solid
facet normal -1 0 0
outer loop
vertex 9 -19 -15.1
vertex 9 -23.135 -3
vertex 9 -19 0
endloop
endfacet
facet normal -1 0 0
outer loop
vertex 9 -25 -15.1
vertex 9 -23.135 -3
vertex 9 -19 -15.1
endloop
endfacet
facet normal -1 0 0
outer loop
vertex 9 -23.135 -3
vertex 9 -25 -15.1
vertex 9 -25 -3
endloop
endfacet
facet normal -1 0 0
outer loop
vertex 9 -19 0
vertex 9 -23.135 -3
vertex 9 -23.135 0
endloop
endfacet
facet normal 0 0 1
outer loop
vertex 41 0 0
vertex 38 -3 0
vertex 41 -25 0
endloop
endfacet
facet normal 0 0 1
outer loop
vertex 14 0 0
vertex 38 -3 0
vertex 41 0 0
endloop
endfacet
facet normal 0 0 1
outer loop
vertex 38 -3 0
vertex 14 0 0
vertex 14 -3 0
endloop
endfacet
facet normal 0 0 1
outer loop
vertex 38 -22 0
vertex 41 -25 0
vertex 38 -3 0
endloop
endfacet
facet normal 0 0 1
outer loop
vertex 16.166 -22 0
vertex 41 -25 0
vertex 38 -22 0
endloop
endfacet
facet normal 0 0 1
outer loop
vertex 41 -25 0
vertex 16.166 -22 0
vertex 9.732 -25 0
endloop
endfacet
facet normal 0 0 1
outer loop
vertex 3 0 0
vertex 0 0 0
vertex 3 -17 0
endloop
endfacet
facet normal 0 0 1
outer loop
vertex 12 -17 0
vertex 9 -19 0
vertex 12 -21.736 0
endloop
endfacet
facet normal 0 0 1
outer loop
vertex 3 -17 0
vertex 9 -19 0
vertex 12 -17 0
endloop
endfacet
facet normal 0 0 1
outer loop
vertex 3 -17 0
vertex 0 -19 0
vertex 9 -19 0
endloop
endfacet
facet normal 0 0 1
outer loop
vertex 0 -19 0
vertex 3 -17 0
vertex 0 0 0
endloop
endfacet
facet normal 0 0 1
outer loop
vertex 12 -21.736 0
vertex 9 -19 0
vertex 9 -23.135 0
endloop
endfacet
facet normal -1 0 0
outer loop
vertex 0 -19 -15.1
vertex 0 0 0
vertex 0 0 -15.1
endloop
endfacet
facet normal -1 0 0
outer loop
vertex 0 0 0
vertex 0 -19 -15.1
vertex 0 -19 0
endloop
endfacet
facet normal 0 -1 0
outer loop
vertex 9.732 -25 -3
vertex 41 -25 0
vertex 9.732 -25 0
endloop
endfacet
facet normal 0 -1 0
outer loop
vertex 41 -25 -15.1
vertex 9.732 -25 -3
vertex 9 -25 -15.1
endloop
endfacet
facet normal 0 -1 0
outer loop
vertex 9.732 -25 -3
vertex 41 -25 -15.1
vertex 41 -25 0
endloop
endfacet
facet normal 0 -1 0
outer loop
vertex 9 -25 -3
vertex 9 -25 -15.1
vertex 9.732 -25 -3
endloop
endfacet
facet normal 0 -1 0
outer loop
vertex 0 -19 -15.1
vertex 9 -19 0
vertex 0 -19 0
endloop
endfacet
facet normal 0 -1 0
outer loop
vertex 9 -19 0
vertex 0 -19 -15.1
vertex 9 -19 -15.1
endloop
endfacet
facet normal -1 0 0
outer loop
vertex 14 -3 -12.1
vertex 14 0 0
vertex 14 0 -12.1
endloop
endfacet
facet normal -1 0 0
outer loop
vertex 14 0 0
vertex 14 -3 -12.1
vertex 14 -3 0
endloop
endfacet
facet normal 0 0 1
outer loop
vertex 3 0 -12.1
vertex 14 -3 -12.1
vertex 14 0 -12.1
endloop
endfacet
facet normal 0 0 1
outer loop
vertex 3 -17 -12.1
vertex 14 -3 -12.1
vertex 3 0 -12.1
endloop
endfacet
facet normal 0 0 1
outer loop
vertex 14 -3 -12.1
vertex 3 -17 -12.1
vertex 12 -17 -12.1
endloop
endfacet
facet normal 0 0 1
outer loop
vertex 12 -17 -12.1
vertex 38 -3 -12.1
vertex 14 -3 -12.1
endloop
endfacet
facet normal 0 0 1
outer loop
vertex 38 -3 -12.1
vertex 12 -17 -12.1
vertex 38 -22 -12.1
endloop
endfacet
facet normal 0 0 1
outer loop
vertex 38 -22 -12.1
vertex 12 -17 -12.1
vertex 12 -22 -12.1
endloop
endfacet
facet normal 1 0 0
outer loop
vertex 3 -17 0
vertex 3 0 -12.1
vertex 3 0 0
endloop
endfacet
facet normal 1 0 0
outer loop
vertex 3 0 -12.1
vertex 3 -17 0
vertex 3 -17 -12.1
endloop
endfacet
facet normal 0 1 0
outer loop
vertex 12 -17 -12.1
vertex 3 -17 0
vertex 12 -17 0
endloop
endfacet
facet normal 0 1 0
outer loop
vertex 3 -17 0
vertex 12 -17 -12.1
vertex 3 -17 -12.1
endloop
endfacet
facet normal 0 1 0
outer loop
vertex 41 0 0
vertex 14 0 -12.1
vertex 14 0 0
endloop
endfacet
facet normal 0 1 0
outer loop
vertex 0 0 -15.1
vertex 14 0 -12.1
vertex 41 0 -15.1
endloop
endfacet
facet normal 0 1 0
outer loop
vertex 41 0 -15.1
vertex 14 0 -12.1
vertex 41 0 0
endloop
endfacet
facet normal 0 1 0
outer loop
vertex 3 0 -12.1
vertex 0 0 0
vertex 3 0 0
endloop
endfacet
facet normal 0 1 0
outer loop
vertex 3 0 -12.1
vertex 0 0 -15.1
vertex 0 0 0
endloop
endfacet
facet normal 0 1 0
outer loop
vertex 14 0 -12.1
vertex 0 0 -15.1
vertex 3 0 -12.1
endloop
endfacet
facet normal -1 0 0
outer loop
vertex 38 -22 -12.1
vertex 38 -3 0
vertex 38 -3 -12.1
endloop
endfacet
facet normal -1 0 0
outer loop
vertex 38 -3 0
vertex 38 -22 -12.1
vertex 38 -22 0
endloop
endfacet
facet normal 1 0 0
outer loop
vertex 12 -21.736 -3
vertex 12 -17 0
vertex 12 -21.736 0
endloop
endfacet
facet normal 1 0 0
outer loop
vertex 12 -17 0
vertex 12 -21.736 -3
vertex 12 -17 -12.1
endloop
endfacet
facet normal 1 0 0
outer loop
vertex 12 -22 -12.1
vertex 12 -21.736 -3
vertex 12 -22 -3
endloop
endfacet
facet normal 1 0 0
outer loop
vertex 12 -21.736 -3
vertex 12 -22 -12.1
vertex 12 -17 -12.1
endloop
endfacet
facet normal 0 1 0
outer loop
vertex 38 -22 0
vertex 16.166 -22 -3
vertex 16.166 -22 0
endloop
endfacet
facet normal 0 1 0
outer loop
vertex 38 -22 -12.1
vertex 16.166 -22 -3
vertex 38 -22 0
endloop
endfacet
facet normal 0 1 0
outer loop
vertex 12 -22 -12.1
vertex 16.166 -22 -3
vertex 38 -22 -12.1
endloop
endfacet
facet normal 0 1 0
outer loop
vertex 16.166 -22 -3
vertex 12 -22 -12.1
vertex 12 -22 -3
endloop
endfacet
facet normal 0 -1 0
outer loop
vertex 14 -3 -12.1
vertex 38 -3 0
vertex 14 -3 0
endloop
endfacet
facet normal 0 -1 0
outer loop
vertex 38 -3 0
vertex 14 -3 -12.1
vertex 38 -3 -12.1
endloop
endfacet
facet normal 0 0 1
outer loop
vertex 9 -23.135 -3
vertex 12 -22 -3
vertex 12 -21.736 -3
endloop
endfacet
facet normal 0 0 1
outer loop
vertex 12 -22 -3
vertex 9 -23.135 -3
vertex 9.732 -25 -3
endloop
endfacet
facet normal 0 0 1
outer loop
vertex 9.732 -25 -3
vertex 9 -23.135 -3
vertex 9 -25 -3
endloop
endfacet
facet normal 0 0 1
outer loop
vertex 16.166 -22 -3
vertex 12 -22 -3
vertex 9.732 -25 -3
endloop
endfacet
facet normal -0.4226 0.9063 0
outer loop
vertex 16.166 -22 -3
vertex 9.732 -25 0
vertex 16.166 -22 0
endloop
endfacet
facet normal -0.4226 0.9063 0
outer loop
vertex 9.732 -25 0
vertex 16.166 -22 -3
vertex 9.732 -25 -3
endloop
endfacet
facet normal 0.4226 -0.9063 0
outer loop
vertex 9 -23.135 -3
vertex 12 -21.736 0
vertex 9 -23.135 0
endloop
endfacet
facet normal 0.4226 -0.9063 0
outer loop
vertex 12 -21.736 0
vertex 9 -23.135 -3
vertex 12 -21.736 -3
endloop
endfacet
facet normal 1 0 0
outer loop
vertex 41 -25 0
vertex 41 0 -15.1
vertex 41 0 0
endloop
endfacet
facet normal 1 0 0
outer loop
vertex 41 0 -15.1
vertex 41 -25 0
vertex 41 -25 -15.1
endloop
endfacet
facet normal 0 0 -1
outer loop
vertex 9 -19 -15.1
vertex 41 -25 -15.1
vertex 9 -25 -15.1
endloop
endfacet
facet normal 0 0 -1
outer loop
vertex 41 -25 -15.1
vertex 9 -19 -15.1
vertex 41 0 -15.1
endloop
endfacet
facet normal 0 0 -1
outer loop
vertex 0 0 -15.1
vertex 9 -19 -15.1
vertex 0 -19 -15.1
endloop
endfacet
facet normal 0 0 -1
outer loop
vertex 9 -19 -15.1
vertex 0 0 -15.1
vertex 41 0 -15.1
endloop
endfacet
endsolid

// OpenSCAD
// Messschieber Superkondensator  Gehäuse

// USB-B-Stecker
usl = 13.6;
usb = 17.0;
ush = 11.0;

// Deckeldicke
gdd = 3.0;    
// Gehäusehöhe
gh = usl-1.5;
// Gehäusewanddicke
gwd = 3.0;
// Gehäusegesamtlänge
ggl = 41.0;
// Gehäusegesamtbreite
ggb = 25.0;

// Schraubenabsatz Länge und Breite
sal = 9.0;
sab = 6.0;

//----------------------------------------
rotate([180,0,0]) {
    difference() {
        cube([ggl,ggb,gh+gdd]);
        
        //schnittebene();
        loecher();    
    }
    
}

//----------------------------------------
module schnittebene() {
    color("blue")
    translate([-50.0,-50.0,10.0])
    cube([100.0,100.0,100.0]);
}

//----------------------------------------
module loecher() {
    // Schraubenabsatz
    translate([0.0,ggb-sab,0.0])
    cube([sal,sab,gh+gdd+1]);
   
    // USB-Stecker
    translate([gwd,0.0,-1.5])
    cube([ush,usb,usl]);
    
    // Gehäuseausschnitt
    translate([sal+gwd,gwd,0.0])
    cube([ggl-sal-gwd*2.0,ggb-gwd*2.0,gh]);    
        
    // Kabellöcher
    translate([5.0,usb+8.0,0.0])
    rotate([0.0,0.0,-25.0])
    cube([20.0,2.0,3.0]);    
    /*
    translate([ggl-gwd-1,ggb/2.0-3.0,0.0])
    cube([10.0,2.0,2.0]);    
    translate([ggl-gwd-1,ggb/2.0+3.0,0.0])
    cube([10.0,2.0,2.0]);
    */
}
